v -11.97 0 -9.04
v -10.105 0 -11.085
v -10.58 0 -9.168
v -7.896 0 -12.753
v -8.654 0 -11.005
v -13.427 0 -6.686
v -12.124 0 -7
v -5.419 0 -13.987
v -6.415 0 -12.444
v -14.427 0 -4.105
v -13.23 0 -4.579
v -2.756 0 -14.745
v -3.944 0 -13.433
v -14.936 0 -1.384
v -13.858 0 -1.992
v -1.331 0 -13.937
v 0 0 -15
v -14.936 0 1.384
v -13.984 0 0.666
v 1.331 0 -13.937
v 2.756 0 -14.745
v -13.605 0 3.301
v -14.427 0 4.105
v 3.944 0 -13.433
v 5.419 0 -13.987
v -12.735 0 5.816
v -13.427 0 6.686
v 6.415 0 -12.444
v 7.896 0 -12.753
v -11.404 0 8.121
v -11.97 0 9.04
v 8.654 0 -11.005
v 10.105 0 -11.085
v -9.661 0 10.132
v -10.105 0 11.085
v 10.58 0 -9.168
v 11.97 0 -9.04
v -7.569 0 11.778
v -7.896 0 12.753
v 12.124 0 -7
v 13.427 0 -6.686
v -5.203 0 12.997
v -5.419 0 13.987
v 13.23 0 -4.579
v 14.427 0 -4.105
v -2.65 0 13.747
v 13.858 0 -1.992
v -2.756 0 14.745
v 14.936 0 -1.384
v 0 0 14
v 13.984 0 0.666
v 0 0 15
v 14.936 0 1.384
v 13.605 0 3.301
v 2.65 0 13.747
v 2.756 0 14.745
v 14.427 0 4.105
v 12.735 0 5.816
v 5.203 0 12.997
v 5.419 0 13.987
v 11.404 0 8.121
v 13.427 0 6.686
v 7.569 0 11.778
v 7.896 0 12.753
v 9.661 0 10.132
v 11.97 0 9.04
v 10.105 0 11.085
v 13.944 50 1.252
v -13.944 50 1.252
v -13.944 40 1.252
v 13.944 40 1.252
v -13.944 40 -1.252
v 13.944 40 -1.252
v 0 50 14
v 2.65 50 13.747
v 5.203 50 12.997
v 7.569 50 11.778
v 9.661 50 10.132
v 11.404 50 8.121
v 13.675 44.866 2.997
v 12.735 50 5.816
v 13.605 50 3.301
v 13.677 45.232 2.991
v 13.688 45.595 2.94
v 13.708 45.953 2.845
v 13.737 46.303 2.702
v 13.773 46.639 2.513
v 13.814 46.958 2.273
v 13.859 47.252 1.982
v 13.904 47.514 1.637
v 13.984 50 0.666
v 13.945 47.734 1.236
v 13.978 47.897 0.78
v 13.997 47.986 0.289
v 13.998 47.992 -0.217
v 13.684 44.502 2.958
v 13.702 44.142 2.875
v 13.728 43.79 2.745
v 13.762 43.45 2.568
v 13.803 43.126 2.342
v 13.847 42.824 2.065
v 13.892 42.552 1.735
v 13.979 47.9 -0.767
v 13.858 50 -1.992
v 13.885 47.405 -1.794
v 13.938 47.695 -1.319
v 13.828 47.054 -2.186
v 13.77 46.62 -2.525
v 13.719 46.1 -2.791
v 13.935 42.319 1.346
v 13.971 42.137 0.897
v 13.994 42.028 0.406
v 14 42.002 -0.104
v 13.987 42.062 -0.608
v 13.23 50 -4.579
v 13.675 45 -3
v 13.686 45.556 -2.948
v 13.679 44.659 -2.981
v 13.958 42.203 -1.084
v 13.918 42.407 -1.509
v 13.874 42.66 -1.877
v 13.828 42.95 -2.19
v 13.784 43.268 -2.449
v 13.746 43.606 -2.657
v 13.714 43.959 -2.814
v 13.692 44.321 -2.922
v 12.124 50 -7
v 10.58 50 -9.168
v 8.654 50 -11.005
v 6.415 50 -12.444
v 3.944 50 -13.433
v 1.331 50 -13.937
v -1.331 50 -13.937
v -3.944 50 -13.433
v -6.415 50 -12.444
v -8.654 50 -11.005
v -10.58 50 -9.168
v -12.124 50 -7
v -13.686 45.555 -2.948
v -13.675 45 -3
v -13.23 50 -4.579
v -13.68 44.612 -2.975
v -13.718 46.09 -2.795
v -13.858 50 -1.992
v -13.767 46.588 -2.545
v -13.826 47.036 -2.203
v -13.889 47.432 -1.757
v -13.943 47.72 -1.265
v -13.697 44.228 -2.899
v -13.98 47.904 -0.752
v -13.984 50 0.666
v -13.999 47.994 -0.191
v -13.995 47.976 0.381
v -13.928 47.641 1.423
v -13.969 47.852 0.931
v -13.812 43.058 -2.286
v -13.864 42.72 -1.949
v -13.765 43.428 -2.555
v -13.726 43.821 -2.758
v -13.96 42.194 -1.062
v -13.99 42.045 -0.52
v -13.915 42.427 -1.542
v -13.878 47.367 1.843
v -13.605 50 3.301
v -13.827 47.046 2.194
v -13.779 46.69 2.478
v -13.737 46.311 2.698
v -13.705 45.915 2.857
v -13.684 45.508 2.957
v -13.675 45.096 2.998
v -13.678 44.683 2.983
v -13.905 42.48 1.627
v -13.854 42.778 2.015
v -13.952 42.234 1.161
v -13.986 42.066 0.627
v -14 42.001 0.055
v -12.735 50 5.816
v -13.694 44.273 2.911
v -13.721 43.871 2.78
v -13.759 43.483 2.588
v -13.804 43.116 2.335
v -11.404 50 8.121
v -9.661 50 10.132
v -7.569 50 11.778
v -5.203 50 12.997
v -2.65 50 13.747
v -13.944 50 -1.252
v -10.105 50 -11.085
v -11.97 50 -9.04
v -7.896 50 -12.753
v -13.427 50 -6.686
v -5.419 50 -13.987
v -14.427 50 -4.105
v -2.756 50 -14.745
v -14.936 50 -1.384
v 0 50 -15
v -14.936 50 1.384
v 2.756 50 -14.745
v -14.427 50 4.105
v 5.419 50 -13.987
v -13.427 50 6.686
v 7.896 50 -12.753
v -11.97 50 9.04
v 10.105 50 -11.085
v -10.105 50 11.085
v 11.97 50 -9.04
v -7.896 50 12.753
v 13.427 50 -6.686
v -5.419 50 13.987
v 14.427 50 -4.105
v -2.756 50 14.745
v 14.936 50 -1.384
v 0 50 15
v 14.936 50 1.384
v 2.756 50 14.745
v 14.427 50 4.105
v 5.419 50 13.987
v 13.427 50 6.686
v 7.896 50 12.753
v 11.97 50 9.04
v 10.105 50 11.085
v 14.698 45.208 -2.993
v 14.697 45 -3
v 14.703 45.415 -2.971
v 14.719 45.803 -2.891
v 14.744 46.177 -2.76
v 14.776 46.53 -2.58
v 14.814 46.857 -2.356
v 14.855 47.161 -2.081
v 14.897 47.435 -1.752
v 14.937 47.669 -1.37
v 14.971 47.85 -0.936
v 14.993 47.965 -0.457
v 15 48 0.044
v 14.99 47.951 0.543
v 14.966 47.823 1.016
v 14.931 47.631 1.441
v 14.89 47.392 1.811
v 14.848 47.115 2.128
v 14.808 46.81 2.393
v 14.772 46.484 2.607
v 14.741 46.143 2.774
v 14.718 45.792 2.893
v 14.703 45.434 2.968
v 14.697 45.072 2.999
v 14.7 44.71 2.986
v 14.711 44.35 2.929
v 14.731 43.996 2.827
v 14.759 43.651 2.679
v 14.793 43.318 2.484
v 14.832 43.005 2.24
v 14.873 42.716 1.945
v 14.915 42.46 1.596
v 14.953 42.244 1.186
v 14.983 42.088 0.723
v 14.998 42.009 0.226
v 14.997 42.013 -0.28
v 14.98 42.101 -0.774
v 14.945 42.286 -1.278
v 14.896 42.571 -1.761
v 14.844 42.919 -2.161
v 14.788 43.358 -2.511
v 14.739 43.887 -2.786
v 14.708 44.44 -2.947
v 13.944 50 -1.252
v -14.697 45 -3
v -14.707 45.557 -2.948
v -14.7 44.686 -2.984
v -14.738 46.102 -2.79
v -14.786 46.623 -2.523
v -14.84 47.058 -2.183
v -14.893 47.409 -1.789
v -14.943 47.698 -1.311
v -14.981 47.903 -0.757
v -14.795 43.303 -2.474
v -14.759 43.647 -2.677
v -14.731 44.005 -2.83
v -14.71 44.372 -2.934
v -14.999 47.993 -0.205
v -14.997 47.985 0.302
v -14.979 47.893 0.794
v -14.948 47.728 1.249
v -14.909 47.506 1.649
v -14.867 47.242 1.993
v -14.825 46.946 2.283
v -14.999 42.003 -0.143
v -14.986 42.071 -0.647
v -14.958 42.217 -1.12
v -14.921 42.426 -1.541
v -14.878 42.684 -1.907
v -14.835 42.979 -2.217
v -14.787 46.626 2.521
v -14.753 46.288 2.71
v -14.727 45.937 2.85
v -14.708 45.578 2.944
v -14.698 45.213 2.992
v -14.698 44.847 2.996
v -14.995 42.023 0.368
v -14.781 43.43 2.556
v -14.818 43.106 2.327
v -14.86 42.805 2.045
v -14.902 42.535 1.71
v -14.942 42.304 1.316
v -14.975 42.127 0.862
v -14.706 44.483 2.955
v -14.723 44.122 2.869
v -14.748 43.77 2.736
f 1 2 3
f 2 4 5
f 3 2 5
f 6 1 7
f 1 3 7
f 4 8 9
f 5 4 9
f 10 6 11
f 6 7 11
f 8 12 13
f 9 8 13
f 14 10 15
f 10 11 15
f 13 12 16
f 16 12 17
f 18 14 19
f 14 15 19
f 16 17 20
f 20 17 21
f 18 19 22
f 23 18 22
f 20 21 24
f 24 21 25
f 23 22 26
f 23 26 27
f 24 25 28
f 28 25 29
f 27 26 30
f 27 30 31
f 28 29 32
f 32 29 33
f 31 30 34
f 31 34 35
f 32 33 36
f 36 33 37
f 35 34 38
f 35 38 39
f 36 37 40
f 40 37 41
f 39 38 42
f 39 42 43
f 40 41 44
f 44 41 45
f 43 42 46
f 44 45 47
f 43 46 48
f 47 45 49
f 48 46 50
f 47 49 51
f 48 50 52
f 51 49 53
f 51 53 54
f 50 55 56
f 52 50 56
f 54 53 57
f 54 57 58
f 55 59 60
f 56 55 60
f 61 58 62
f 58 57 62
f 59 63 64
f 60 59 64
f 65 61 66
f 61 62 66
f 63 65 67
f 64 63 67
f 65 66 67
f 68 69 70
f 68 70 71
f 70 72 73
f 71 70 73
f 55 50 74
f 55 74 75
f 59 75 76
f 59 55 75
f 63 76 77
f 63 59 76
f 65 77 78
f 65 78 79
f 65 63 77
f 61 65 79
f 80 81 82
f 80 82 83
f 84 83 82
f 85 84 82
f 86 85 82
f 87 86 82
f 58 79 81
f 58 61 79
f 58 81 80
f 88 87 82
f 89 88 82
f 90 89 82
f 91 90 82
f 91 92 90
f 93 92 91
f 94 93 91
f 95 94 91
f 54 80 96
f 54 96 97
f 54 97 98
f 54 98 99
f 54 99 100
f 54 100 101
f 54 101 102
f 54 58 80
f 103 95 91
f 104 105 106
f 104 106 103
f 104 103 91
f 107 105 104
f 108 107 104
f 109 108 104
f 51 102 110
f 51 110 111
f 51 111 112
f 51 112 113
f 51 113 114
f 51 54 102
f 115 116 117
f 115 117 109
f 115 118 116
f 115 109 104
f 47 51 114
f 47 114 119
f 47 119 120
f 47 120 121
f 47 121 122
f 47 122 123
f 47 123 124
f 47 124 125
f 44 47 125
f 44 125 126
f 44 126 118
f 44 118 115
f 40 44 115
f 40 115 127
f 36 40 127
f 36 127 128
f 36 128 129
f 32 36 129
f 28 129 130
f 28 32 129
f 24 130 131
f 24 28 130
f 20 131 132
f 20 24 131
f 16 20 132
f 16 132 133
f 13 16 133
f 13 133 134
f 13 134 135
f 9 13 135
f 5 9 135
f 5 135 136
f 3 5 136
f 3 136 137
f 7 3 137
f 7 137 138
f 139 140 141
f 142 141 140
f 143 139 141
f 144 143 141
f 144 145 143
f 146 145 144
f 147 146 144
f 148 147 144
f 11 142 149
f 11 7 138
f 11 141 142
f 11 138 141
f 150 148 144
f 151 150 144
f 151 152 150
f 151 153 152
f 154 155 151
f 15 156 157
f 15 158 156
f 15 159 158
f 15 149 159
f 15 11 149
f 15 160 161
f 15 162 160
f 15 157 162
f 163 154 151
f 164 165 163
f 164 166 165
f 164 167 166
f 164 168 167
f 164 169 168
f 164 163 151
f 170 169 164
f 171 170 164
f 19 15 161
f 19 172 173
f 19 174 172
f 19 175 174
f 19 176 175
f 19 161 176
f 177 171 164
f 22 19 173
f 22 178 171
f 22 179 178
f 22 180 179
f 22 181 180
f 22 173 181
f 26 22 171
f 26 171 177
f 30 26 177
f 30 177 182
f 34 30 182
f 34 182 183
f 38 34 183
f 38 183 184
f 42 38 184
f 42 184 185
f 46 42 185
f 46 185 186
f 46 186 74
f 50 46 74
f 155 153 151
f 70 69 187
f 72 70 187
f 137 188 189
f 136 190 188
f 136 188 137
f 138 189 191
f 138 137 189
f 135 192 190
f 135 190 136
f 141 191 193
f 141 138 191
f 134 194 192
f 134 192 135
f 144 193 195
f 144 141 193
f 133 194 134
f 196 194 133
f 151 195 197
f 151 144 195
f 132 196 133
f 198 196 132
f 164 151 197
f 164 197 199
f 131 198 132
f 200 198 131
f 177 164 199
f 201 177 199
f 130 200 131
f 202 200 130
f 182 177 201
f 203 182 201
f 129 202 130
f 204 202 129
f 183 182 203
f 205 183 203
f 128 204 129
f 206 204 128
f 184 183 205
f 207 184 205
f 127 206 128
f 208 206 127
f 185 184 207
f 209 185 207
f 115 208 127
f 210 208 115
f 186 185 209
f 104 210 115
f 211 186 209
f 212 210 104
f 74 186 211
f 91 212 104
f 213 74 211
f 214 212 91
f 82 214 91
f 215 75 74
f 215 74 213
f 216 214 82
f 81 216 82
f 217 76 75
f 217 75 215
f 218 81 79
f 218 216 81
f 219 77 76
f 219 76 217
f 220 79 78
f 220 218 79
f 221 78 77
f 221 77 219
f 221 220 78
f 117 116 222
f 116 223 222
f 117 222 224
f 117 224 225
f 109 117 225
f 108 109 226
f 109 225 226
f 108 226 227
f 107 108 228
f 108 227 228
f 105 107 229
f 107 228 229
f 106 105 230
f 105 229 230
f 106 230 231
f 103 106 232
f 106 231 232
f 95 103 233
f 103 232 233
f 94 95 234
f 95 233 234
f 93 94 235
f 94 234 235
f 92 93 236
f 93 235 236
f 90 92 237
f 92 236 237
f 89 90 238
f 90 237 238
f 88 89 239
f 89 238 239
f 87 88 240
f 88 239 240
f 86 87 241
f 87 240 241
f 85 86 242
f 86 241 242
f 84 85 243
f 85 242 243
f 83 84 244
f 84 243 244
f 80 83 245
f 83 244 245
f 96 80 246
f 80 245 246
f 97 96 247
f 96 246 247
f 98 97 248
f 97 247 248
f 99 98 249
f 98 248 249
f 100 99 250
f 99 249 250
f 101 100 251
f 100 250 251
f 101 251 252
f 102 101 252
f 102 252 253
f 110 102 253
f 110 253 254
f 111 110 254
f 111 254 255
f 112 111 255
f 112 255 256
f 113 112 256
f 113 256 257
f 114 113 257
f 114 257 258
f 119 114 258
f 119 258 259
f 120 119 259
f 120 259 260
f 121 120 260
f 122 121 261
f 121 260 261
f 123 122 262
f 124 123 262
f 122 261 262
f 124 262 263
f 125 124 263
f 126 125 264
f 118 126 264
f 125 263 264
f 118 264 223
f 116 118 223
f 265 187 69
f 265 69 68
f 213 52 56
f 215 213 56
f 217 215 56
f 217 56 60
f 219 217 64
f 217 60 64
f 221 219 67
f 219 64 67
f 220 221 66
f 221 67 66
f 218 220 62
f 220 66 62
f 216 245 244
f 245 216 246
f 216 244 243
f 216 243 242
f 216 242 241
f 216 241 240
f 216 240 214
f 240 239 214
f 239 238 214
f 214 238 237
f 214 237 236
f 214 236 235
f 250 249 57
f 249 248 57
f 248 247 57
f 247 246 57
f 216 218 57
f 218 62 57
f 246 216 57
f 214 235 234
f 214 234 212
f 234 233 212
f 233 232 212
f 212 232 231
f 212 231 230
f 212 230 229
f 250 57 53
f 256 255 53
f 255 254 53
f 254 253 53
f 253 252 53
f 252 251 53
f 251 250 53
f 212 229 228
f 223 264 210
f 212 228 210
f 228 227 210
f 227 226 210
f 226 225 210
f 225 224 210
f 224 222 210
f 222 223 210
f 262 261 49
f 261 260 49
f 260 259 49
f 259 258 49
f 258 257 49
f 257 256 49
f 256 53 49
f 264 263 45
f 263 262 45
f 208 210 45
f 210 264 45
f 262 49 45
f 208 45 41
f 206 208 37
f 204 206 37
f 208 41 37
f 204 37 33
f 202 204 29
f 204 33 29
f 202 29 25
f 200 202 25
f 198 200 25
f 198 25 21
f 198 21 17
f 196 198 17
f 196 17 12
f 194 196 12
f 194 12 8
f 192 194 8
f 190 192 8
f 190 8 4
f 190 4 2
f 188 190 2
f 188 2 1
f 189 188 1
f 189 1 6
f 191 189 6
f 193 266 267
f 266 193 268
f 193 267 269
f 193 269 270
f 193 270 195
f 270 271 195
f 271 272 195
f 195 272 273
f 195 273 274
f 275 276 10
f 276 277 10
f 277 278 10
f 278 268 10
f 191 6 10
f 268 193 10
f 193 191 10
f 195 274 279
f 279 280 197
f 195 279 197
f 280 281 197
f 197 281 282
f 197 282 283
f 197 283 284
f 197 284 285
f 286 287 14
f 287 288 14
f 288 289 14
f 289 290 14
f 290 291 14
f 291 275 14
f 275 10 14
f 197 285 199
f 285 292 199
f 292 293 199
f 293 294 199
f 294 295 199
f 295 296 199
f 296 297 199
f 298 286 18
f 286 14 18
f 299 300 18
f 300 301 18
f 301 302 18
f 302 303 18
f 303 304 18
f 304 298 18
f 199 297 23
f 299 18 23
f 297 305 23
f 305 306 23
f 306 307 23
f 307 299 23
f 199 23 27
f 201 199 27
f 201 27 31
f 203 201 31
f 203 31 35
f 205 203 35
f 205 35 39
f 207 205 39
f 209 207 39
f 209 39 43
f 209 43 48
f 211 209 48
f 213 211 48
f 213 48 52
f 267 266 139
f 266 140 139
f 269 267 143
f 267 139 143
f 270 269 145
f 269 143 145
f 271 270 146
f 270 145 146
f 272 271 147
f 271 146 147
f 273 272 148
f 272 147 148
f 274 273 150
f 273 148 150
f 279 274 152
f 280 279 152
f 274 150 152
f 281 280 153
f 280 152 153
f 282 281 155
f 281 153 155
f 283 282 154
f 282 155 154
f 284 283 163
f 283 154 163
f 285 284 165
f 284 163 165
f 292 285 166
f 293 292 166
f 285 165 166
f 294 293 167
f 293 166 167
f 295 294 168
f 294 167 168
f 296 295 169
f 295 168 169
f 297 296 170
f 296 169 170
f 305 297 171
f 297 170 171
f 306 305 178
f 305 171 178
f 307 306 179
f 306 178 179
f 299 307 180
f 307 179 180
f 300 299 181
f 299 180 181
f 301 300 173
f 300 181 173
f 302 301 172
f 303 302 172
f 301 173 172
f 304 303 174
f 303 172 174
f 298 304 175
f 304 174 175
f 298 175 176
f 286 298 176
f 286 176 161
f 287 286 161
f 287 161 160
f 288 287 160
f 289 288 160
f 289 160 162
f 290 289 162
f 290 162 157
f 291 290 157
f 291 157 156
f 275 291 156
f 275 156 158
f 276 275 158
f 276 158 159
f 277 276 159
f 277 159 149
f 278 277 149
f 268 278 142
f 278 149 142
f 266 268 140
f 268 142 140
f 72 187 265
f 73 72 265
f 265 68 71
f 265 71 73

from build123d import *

# Parameters (mm, degrees)
SKETCH1_R           = 15
SKETCH1_R_2         = 14
BOSS_EXTRUDE1_DEPTH = 50
SKETCH2_R           = 3
CUT_EXTRUDE1_DEPTH  = 15
SKETCH3_W           = 27.887788492
SKETCH3_H           = 2.504247004
BOSS_EXTRUDE2_DEPTH = 10


with BuildPart() as part:
    # Sketch1 → Boss-Extrude1 (new body)
    with BuildSketch(Plane(origin=(0, 0, 0), x_dir=(1, 0, 0), z_dir=(0, 1, 0))):
        with Locations(Location((0, 0, 0), (0, 0, 270))):
            Circle(SKETCH1_R)
        with Locations(Location((0, 0, 0), (0, 0, 270))):
            Circle(SKETCH1_R_2, mode=Mode.SUBTRACT)
    extrude(amount=BOSS_EXTRUDE1_DEPTH)

    # Sketch2 → Cut-Extrude1 (cut, symmetric)
    with BuildSketch(Plane(origin=(0, 0, 0), x_dir=(0, 0, -1), z_dir=(1, 0, 0))):
        with Locations((0, 45)):
            Circle(SKETCH2_R)
    extrude(amount=CUT_EXTRUDE1_DEPTH, both=True, mode=Mode.SUBTRACT)


with BuildPart() as body_2:
    # Sketch3 → Boss-Extrude2 (new body)
    with BuildSketch(Plane(origin=(0, 50, 0), x_dir=(1, 0, 0), z_dir=(0, 1, 0))):
        Rectangle(SKETCH3_W, SKETCH3_H)
    extrude(amount=-BOSS_EXTRUDE2_DEPTH)


solid = Compound([part.part, body_2.part])
